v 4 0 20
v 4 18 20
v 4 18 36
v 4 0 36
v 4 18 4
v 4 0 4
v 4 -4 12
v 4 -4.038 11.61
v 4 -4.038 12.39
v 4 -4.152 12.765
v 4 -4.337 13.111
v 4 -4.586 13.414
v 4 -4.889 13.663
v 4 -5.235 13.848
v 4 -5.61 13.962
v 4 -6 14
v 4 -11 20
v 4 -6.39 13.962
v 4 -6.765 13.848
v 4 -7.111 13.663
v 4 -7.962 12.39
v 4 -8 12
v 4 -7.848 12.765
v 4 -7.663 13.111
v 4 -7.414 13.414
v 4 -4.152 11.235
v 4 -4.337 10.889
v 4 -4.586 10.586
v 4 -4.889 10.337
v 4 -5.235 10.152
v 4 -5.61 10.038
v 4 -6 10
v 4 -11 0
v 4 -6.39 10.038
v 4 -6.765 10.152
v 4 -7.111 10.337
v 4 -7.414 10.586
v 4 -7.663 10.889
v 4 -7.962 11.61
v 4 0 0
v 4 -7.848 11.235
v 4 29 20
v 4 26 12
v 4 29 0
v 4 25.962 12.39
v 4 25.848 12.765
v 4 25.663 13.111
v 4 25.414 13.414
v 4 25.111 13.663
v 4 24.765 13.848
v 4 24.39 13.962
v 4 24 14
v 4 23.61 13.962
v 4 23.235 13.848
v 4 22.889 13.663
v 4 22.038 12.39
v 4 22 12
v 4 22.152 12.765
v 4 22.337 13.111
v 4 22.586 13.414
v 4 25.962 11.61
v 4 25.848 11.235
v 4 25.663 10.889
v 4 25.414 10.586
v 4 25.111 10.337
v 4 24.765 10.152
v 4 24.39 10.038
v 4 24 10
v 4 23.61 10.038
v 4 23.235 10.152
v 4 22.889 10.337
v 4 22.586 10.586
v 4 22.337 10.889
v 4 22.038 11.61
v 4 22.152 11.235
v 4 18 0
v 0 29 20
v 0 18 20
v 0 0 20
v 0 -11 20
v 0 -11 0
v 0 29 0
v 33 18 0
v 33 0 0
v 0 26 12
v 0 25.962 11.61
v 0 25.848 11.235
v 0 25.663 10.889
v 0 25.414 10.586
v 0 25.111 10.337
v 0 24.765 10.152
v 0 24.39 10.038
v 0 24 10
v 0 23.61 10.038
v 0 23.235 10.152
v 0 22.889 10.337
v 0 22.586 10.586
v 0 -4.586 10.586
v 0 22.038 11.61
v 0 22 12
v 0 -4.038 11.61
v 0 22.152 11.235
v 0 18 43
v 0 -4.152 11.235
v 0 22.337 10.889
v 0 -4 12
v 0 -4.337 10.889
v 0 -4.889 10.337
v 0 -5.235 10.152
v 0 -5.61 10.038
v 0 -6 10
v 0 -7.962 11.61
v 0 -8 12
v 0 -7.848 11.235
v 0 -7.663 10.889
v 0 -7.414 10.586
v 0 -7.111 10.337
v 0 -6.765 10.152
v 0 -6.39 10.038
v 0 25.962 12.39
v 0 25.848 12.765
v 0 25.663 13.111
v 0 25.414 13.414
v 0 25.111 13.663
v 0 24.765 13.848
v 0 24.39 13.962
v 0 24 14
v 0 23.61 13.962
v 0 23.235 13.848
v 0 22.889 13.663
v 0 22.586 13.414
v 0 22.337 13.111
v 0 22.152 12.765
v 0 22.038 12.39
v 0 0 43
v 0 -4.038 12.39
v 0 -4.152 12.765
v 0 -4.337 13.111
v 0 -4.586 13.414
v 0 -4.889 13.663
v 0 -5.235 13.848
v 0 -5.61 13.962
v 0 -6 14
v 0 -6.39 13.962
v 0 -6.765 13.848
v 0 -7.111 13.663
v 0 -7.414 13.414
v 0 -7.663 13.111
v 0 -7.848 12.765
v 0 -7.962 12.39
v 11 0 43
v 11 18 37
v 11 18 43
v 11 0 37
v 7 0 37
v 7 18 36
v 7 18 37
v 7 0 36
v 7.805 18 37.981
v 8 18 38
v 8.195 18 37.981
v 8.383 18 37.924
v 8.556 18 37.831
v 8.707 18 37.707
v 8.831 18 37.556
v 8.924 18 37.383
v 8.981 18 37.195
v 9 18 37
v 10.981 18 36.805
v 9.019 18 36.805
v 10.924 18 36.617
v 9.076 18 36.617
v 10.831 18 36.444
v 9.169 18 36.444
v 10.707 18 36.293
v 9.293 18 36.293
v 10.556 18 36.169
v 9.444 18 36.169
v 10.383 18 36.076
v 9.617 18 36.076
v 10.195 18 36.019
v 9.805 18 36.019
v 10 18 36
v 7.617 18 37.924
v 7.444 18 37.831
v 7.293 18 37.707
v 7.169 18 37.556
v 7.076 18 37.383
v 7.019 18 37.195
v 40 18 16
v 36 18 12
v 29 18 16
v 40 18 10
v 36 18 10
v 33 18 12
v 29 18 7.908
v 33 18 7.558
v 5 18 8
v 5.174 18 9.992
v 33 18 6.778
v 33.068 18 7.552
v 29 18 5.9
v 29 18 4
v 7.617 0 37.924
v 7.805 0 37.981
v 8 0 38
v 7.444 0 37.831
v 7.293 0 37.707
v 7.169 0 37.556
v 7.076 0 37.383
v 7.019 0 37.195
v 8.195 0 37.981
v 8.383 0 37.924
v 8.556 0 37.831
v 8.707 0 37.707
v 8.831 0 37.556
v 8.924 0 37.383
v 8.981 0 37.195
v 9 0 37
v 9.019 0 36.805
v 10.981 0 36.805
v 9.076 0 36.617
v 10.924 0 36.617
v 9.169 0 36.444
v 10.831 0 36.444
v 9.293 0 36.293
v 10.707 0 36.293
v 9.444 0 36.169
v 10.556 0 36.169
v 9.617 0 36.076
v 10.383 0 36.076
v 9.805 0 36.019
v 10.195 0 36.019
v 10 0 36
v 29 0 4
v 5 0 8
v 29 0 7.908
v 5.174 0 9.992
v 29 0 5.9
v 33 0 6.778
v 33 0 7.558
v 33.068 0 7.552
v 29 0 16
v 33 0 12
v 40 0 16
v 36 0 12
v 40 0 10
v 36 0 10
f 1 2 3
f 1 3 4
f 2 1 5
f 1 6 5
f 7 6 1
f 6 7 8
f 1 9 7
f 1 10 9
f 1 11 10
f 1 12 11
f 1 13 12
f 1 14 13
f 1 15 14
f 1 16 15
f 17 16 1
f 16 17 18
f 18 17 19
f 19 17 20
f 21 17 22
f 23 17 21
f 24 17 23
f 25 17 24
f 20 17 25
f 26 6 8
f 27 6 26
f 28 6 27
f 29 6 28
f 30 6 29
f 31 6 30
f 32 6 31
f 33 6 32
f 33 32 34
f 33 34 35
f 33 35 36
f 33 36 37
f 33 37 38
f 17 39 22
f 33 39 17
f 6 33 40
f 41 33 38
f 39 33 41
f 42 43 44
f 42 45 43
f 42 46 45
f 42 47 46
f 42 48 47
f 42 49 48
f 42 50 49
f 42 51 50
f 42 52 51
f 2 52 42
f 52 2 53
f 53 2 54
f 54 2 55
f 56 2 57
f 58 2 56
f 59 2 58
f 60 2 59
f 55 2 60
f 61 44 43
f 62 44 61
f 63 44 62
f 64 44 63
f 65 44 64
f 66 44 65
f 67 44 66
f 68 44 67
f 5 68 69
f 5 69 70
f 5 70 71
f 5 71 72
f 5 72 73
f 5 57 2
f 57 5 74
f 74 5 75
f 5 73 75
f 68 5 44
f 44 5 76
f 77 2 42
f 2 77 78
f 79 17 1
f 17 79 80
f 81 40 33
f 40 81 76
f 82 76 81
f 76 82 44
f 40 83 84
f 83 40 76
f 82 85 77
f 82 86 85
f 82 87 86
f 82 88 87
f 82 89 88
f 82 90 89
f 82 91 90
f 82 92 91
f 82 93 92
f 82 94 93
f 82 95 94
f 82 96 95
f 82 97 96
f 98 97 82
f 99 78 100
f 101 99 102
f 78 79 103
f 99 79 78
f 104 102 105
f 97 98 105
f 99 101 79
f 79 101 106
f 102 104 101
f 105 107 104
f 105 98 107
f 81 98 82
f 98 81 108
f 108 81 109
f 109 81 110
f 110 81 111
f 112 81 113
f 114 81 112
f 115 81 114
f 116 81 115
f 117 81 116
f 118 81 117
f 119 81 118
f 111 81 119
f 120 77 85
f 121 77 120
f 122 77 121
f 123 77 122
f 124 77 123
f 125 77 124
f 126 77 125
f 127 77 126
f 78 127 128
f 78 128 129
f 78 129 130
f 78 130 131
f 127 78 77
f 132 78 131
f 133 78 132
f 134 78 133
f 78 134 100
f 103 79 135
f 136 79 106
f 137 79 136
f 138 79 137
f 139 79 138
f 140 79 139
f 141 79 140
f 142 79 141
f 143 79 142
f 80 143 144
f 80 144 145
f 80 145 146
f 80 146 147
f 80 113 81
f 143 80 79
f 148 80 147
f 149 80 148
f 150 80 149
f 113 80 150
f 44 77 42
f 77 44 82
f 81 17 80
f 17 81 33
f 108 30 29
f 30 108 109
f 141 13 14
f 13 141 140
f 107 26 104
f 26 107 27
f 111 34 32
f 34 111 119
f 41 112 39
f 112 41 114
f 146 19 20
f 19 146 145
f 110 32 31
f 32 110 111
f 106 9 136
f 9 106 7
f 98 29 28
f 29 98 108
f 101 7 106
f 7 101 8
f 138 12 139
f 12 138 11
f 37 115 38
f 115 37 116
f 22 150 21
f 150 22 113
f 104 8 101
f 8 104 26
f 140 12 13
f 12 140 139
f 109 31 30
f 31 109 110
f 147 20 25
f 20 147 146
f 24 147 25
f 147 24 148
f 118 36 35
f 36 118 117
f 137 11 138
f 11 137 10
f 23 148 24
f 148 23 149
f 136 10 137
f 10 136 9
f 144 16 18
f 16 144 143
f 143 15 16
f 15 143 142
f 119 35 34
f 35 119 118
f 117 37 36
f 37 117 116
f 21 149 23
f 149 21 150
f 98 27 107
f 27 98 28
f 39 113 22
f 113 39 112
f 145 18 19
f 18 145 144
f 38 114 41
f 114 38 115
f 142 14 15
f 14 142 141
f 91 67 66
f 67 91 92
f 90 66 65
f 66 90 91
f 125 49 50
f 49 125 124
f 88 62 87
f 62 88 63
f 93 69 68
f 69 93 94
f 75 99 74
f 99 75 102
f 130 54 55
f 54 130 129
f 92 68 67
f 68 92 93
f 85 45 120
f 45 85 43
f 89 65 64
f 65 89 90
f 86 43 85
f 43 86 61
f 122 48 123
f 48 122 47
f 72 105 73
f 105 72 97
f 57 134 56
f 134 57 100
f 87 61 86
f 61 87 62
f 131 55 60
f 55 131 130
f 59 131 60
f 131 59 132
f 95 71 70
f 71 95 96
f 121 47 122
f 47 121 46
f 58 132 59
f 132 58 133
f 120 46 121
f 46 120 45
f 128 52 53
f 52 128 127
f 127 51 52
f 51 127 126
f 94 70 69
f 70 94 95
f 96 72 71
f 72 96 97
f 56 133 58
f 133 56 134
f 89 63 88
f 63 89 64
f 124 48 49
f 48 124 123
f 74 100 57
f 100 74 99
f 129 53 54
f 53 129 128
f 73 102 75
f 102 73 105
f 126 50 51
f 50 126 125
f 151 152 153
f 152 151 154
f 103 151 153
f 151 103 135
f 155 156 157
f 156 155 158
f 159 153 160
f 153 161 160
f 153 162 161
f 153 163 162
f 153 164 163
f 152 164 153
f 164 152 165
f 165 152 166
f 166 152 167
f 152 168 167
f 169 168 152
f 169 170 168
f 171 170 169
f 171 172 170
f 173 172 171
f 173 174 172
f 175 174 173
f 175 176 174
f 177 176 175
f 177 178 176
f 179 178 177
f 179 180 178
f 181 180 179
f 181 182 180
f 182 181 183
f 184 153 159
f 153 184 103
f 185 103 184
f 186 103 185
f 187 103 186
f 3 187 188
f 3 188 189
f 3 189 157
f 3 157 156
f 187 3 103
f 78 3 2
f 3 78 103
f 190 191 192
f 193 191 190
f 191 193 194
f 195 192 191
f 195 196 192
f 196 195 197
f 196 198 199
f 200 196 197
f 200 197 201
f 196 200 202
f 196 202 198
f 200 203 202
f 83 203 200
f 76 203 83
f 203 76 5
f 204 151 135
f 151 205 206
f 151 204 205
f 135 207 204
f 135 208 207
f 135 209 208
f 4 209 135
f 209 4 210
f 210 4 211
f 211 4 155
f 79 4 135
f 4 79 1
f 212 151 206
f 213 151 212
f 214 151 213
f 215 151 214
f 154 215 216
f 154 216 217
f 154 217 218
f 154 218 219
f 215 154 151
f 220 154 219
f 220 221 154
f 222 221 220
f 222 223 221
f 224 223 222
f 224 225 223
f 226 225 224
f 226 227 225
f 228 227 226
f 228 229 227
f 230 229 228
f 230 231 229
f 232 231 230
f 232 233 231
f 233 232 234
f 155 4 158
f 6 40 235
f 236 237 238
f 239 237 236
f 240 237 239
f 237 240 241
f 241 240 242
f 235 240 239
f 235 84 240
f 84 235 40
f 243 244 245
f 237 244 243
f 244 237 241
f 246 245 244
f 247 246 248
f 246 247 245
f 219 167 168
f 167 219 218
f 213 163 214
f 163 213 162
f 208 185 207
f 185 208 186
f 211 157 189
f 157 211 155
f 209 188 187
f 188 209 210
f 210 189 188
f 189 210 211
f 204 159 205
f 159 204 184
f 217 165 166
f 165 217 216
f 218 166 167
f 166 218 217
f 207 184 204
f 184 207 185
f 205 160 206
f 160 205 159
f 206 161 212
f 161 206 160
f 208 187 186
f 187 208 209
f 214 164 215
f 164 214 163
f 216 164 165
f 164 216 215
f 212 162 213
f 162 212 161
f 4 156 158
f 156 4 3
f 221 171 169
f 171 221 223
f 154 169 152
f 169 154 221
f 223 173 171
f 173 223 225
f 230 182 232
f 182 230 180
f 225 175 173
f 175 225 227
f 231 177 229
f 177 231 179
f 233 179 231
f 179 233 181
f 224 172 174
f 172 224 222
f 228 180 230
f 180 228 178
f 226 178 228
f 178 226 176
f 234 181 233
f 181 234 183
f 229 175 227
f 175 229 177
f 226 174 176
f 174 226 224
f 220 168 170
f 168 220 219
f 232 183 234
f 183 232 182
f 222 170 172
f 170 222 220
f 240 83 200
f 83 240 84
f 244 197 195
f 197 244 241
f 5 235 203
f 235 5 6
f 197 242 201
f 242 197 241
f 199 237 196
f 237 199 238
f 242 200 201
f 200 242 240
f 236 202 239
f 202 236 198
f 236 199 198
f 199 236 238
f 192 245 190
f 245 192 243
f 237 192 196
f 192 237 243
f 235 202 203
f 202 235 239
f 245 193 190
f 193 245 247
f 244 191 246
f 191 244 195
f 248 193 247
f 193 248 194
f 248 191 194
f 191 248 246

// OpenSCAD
$fn=32;

main();

module main() {
  w = 18;

  cube([33,w,4]);
  translate([5,0,8]) rotate([0,5,0]) cube([28,w,2]);
  translate([29,0,0]) cube([4,w,16]);
  translate([29,0,12]) cube([11,w,4]);
  translate([36,0,10]) cube([4,w,6]);
  cube([4,w,43]);
  mountPlate(w);
  translate([0,0,36]) top(w);
}

module top(w) {   
  translate([0,0,3]) cube([11,w,4]);
  translate([3,0,0]) cube([4,w,7]);
  difference() {
    translate([7,0,1]) cube([4,w,6]);
    translate([8,-0.5,1]) rotate([-90,0,0]) cylinder(r=1,h=w+1);
  }
  translate([10,0,1]) rotate([-90,0,0]) cylinder(r=1,h=w);
}

module mountPlate(w) {
  translate([0,-11,0]) {
    difference() {
      cube([4,40,20]);
      translate([-0.5,5,12]) rotate([0,90,0]) cylinder(r=2,h=5);
      translate([-0.5,35,12]) rotate([0,90,0]) cylinder(r=2,h=5);
    }
  }
}
